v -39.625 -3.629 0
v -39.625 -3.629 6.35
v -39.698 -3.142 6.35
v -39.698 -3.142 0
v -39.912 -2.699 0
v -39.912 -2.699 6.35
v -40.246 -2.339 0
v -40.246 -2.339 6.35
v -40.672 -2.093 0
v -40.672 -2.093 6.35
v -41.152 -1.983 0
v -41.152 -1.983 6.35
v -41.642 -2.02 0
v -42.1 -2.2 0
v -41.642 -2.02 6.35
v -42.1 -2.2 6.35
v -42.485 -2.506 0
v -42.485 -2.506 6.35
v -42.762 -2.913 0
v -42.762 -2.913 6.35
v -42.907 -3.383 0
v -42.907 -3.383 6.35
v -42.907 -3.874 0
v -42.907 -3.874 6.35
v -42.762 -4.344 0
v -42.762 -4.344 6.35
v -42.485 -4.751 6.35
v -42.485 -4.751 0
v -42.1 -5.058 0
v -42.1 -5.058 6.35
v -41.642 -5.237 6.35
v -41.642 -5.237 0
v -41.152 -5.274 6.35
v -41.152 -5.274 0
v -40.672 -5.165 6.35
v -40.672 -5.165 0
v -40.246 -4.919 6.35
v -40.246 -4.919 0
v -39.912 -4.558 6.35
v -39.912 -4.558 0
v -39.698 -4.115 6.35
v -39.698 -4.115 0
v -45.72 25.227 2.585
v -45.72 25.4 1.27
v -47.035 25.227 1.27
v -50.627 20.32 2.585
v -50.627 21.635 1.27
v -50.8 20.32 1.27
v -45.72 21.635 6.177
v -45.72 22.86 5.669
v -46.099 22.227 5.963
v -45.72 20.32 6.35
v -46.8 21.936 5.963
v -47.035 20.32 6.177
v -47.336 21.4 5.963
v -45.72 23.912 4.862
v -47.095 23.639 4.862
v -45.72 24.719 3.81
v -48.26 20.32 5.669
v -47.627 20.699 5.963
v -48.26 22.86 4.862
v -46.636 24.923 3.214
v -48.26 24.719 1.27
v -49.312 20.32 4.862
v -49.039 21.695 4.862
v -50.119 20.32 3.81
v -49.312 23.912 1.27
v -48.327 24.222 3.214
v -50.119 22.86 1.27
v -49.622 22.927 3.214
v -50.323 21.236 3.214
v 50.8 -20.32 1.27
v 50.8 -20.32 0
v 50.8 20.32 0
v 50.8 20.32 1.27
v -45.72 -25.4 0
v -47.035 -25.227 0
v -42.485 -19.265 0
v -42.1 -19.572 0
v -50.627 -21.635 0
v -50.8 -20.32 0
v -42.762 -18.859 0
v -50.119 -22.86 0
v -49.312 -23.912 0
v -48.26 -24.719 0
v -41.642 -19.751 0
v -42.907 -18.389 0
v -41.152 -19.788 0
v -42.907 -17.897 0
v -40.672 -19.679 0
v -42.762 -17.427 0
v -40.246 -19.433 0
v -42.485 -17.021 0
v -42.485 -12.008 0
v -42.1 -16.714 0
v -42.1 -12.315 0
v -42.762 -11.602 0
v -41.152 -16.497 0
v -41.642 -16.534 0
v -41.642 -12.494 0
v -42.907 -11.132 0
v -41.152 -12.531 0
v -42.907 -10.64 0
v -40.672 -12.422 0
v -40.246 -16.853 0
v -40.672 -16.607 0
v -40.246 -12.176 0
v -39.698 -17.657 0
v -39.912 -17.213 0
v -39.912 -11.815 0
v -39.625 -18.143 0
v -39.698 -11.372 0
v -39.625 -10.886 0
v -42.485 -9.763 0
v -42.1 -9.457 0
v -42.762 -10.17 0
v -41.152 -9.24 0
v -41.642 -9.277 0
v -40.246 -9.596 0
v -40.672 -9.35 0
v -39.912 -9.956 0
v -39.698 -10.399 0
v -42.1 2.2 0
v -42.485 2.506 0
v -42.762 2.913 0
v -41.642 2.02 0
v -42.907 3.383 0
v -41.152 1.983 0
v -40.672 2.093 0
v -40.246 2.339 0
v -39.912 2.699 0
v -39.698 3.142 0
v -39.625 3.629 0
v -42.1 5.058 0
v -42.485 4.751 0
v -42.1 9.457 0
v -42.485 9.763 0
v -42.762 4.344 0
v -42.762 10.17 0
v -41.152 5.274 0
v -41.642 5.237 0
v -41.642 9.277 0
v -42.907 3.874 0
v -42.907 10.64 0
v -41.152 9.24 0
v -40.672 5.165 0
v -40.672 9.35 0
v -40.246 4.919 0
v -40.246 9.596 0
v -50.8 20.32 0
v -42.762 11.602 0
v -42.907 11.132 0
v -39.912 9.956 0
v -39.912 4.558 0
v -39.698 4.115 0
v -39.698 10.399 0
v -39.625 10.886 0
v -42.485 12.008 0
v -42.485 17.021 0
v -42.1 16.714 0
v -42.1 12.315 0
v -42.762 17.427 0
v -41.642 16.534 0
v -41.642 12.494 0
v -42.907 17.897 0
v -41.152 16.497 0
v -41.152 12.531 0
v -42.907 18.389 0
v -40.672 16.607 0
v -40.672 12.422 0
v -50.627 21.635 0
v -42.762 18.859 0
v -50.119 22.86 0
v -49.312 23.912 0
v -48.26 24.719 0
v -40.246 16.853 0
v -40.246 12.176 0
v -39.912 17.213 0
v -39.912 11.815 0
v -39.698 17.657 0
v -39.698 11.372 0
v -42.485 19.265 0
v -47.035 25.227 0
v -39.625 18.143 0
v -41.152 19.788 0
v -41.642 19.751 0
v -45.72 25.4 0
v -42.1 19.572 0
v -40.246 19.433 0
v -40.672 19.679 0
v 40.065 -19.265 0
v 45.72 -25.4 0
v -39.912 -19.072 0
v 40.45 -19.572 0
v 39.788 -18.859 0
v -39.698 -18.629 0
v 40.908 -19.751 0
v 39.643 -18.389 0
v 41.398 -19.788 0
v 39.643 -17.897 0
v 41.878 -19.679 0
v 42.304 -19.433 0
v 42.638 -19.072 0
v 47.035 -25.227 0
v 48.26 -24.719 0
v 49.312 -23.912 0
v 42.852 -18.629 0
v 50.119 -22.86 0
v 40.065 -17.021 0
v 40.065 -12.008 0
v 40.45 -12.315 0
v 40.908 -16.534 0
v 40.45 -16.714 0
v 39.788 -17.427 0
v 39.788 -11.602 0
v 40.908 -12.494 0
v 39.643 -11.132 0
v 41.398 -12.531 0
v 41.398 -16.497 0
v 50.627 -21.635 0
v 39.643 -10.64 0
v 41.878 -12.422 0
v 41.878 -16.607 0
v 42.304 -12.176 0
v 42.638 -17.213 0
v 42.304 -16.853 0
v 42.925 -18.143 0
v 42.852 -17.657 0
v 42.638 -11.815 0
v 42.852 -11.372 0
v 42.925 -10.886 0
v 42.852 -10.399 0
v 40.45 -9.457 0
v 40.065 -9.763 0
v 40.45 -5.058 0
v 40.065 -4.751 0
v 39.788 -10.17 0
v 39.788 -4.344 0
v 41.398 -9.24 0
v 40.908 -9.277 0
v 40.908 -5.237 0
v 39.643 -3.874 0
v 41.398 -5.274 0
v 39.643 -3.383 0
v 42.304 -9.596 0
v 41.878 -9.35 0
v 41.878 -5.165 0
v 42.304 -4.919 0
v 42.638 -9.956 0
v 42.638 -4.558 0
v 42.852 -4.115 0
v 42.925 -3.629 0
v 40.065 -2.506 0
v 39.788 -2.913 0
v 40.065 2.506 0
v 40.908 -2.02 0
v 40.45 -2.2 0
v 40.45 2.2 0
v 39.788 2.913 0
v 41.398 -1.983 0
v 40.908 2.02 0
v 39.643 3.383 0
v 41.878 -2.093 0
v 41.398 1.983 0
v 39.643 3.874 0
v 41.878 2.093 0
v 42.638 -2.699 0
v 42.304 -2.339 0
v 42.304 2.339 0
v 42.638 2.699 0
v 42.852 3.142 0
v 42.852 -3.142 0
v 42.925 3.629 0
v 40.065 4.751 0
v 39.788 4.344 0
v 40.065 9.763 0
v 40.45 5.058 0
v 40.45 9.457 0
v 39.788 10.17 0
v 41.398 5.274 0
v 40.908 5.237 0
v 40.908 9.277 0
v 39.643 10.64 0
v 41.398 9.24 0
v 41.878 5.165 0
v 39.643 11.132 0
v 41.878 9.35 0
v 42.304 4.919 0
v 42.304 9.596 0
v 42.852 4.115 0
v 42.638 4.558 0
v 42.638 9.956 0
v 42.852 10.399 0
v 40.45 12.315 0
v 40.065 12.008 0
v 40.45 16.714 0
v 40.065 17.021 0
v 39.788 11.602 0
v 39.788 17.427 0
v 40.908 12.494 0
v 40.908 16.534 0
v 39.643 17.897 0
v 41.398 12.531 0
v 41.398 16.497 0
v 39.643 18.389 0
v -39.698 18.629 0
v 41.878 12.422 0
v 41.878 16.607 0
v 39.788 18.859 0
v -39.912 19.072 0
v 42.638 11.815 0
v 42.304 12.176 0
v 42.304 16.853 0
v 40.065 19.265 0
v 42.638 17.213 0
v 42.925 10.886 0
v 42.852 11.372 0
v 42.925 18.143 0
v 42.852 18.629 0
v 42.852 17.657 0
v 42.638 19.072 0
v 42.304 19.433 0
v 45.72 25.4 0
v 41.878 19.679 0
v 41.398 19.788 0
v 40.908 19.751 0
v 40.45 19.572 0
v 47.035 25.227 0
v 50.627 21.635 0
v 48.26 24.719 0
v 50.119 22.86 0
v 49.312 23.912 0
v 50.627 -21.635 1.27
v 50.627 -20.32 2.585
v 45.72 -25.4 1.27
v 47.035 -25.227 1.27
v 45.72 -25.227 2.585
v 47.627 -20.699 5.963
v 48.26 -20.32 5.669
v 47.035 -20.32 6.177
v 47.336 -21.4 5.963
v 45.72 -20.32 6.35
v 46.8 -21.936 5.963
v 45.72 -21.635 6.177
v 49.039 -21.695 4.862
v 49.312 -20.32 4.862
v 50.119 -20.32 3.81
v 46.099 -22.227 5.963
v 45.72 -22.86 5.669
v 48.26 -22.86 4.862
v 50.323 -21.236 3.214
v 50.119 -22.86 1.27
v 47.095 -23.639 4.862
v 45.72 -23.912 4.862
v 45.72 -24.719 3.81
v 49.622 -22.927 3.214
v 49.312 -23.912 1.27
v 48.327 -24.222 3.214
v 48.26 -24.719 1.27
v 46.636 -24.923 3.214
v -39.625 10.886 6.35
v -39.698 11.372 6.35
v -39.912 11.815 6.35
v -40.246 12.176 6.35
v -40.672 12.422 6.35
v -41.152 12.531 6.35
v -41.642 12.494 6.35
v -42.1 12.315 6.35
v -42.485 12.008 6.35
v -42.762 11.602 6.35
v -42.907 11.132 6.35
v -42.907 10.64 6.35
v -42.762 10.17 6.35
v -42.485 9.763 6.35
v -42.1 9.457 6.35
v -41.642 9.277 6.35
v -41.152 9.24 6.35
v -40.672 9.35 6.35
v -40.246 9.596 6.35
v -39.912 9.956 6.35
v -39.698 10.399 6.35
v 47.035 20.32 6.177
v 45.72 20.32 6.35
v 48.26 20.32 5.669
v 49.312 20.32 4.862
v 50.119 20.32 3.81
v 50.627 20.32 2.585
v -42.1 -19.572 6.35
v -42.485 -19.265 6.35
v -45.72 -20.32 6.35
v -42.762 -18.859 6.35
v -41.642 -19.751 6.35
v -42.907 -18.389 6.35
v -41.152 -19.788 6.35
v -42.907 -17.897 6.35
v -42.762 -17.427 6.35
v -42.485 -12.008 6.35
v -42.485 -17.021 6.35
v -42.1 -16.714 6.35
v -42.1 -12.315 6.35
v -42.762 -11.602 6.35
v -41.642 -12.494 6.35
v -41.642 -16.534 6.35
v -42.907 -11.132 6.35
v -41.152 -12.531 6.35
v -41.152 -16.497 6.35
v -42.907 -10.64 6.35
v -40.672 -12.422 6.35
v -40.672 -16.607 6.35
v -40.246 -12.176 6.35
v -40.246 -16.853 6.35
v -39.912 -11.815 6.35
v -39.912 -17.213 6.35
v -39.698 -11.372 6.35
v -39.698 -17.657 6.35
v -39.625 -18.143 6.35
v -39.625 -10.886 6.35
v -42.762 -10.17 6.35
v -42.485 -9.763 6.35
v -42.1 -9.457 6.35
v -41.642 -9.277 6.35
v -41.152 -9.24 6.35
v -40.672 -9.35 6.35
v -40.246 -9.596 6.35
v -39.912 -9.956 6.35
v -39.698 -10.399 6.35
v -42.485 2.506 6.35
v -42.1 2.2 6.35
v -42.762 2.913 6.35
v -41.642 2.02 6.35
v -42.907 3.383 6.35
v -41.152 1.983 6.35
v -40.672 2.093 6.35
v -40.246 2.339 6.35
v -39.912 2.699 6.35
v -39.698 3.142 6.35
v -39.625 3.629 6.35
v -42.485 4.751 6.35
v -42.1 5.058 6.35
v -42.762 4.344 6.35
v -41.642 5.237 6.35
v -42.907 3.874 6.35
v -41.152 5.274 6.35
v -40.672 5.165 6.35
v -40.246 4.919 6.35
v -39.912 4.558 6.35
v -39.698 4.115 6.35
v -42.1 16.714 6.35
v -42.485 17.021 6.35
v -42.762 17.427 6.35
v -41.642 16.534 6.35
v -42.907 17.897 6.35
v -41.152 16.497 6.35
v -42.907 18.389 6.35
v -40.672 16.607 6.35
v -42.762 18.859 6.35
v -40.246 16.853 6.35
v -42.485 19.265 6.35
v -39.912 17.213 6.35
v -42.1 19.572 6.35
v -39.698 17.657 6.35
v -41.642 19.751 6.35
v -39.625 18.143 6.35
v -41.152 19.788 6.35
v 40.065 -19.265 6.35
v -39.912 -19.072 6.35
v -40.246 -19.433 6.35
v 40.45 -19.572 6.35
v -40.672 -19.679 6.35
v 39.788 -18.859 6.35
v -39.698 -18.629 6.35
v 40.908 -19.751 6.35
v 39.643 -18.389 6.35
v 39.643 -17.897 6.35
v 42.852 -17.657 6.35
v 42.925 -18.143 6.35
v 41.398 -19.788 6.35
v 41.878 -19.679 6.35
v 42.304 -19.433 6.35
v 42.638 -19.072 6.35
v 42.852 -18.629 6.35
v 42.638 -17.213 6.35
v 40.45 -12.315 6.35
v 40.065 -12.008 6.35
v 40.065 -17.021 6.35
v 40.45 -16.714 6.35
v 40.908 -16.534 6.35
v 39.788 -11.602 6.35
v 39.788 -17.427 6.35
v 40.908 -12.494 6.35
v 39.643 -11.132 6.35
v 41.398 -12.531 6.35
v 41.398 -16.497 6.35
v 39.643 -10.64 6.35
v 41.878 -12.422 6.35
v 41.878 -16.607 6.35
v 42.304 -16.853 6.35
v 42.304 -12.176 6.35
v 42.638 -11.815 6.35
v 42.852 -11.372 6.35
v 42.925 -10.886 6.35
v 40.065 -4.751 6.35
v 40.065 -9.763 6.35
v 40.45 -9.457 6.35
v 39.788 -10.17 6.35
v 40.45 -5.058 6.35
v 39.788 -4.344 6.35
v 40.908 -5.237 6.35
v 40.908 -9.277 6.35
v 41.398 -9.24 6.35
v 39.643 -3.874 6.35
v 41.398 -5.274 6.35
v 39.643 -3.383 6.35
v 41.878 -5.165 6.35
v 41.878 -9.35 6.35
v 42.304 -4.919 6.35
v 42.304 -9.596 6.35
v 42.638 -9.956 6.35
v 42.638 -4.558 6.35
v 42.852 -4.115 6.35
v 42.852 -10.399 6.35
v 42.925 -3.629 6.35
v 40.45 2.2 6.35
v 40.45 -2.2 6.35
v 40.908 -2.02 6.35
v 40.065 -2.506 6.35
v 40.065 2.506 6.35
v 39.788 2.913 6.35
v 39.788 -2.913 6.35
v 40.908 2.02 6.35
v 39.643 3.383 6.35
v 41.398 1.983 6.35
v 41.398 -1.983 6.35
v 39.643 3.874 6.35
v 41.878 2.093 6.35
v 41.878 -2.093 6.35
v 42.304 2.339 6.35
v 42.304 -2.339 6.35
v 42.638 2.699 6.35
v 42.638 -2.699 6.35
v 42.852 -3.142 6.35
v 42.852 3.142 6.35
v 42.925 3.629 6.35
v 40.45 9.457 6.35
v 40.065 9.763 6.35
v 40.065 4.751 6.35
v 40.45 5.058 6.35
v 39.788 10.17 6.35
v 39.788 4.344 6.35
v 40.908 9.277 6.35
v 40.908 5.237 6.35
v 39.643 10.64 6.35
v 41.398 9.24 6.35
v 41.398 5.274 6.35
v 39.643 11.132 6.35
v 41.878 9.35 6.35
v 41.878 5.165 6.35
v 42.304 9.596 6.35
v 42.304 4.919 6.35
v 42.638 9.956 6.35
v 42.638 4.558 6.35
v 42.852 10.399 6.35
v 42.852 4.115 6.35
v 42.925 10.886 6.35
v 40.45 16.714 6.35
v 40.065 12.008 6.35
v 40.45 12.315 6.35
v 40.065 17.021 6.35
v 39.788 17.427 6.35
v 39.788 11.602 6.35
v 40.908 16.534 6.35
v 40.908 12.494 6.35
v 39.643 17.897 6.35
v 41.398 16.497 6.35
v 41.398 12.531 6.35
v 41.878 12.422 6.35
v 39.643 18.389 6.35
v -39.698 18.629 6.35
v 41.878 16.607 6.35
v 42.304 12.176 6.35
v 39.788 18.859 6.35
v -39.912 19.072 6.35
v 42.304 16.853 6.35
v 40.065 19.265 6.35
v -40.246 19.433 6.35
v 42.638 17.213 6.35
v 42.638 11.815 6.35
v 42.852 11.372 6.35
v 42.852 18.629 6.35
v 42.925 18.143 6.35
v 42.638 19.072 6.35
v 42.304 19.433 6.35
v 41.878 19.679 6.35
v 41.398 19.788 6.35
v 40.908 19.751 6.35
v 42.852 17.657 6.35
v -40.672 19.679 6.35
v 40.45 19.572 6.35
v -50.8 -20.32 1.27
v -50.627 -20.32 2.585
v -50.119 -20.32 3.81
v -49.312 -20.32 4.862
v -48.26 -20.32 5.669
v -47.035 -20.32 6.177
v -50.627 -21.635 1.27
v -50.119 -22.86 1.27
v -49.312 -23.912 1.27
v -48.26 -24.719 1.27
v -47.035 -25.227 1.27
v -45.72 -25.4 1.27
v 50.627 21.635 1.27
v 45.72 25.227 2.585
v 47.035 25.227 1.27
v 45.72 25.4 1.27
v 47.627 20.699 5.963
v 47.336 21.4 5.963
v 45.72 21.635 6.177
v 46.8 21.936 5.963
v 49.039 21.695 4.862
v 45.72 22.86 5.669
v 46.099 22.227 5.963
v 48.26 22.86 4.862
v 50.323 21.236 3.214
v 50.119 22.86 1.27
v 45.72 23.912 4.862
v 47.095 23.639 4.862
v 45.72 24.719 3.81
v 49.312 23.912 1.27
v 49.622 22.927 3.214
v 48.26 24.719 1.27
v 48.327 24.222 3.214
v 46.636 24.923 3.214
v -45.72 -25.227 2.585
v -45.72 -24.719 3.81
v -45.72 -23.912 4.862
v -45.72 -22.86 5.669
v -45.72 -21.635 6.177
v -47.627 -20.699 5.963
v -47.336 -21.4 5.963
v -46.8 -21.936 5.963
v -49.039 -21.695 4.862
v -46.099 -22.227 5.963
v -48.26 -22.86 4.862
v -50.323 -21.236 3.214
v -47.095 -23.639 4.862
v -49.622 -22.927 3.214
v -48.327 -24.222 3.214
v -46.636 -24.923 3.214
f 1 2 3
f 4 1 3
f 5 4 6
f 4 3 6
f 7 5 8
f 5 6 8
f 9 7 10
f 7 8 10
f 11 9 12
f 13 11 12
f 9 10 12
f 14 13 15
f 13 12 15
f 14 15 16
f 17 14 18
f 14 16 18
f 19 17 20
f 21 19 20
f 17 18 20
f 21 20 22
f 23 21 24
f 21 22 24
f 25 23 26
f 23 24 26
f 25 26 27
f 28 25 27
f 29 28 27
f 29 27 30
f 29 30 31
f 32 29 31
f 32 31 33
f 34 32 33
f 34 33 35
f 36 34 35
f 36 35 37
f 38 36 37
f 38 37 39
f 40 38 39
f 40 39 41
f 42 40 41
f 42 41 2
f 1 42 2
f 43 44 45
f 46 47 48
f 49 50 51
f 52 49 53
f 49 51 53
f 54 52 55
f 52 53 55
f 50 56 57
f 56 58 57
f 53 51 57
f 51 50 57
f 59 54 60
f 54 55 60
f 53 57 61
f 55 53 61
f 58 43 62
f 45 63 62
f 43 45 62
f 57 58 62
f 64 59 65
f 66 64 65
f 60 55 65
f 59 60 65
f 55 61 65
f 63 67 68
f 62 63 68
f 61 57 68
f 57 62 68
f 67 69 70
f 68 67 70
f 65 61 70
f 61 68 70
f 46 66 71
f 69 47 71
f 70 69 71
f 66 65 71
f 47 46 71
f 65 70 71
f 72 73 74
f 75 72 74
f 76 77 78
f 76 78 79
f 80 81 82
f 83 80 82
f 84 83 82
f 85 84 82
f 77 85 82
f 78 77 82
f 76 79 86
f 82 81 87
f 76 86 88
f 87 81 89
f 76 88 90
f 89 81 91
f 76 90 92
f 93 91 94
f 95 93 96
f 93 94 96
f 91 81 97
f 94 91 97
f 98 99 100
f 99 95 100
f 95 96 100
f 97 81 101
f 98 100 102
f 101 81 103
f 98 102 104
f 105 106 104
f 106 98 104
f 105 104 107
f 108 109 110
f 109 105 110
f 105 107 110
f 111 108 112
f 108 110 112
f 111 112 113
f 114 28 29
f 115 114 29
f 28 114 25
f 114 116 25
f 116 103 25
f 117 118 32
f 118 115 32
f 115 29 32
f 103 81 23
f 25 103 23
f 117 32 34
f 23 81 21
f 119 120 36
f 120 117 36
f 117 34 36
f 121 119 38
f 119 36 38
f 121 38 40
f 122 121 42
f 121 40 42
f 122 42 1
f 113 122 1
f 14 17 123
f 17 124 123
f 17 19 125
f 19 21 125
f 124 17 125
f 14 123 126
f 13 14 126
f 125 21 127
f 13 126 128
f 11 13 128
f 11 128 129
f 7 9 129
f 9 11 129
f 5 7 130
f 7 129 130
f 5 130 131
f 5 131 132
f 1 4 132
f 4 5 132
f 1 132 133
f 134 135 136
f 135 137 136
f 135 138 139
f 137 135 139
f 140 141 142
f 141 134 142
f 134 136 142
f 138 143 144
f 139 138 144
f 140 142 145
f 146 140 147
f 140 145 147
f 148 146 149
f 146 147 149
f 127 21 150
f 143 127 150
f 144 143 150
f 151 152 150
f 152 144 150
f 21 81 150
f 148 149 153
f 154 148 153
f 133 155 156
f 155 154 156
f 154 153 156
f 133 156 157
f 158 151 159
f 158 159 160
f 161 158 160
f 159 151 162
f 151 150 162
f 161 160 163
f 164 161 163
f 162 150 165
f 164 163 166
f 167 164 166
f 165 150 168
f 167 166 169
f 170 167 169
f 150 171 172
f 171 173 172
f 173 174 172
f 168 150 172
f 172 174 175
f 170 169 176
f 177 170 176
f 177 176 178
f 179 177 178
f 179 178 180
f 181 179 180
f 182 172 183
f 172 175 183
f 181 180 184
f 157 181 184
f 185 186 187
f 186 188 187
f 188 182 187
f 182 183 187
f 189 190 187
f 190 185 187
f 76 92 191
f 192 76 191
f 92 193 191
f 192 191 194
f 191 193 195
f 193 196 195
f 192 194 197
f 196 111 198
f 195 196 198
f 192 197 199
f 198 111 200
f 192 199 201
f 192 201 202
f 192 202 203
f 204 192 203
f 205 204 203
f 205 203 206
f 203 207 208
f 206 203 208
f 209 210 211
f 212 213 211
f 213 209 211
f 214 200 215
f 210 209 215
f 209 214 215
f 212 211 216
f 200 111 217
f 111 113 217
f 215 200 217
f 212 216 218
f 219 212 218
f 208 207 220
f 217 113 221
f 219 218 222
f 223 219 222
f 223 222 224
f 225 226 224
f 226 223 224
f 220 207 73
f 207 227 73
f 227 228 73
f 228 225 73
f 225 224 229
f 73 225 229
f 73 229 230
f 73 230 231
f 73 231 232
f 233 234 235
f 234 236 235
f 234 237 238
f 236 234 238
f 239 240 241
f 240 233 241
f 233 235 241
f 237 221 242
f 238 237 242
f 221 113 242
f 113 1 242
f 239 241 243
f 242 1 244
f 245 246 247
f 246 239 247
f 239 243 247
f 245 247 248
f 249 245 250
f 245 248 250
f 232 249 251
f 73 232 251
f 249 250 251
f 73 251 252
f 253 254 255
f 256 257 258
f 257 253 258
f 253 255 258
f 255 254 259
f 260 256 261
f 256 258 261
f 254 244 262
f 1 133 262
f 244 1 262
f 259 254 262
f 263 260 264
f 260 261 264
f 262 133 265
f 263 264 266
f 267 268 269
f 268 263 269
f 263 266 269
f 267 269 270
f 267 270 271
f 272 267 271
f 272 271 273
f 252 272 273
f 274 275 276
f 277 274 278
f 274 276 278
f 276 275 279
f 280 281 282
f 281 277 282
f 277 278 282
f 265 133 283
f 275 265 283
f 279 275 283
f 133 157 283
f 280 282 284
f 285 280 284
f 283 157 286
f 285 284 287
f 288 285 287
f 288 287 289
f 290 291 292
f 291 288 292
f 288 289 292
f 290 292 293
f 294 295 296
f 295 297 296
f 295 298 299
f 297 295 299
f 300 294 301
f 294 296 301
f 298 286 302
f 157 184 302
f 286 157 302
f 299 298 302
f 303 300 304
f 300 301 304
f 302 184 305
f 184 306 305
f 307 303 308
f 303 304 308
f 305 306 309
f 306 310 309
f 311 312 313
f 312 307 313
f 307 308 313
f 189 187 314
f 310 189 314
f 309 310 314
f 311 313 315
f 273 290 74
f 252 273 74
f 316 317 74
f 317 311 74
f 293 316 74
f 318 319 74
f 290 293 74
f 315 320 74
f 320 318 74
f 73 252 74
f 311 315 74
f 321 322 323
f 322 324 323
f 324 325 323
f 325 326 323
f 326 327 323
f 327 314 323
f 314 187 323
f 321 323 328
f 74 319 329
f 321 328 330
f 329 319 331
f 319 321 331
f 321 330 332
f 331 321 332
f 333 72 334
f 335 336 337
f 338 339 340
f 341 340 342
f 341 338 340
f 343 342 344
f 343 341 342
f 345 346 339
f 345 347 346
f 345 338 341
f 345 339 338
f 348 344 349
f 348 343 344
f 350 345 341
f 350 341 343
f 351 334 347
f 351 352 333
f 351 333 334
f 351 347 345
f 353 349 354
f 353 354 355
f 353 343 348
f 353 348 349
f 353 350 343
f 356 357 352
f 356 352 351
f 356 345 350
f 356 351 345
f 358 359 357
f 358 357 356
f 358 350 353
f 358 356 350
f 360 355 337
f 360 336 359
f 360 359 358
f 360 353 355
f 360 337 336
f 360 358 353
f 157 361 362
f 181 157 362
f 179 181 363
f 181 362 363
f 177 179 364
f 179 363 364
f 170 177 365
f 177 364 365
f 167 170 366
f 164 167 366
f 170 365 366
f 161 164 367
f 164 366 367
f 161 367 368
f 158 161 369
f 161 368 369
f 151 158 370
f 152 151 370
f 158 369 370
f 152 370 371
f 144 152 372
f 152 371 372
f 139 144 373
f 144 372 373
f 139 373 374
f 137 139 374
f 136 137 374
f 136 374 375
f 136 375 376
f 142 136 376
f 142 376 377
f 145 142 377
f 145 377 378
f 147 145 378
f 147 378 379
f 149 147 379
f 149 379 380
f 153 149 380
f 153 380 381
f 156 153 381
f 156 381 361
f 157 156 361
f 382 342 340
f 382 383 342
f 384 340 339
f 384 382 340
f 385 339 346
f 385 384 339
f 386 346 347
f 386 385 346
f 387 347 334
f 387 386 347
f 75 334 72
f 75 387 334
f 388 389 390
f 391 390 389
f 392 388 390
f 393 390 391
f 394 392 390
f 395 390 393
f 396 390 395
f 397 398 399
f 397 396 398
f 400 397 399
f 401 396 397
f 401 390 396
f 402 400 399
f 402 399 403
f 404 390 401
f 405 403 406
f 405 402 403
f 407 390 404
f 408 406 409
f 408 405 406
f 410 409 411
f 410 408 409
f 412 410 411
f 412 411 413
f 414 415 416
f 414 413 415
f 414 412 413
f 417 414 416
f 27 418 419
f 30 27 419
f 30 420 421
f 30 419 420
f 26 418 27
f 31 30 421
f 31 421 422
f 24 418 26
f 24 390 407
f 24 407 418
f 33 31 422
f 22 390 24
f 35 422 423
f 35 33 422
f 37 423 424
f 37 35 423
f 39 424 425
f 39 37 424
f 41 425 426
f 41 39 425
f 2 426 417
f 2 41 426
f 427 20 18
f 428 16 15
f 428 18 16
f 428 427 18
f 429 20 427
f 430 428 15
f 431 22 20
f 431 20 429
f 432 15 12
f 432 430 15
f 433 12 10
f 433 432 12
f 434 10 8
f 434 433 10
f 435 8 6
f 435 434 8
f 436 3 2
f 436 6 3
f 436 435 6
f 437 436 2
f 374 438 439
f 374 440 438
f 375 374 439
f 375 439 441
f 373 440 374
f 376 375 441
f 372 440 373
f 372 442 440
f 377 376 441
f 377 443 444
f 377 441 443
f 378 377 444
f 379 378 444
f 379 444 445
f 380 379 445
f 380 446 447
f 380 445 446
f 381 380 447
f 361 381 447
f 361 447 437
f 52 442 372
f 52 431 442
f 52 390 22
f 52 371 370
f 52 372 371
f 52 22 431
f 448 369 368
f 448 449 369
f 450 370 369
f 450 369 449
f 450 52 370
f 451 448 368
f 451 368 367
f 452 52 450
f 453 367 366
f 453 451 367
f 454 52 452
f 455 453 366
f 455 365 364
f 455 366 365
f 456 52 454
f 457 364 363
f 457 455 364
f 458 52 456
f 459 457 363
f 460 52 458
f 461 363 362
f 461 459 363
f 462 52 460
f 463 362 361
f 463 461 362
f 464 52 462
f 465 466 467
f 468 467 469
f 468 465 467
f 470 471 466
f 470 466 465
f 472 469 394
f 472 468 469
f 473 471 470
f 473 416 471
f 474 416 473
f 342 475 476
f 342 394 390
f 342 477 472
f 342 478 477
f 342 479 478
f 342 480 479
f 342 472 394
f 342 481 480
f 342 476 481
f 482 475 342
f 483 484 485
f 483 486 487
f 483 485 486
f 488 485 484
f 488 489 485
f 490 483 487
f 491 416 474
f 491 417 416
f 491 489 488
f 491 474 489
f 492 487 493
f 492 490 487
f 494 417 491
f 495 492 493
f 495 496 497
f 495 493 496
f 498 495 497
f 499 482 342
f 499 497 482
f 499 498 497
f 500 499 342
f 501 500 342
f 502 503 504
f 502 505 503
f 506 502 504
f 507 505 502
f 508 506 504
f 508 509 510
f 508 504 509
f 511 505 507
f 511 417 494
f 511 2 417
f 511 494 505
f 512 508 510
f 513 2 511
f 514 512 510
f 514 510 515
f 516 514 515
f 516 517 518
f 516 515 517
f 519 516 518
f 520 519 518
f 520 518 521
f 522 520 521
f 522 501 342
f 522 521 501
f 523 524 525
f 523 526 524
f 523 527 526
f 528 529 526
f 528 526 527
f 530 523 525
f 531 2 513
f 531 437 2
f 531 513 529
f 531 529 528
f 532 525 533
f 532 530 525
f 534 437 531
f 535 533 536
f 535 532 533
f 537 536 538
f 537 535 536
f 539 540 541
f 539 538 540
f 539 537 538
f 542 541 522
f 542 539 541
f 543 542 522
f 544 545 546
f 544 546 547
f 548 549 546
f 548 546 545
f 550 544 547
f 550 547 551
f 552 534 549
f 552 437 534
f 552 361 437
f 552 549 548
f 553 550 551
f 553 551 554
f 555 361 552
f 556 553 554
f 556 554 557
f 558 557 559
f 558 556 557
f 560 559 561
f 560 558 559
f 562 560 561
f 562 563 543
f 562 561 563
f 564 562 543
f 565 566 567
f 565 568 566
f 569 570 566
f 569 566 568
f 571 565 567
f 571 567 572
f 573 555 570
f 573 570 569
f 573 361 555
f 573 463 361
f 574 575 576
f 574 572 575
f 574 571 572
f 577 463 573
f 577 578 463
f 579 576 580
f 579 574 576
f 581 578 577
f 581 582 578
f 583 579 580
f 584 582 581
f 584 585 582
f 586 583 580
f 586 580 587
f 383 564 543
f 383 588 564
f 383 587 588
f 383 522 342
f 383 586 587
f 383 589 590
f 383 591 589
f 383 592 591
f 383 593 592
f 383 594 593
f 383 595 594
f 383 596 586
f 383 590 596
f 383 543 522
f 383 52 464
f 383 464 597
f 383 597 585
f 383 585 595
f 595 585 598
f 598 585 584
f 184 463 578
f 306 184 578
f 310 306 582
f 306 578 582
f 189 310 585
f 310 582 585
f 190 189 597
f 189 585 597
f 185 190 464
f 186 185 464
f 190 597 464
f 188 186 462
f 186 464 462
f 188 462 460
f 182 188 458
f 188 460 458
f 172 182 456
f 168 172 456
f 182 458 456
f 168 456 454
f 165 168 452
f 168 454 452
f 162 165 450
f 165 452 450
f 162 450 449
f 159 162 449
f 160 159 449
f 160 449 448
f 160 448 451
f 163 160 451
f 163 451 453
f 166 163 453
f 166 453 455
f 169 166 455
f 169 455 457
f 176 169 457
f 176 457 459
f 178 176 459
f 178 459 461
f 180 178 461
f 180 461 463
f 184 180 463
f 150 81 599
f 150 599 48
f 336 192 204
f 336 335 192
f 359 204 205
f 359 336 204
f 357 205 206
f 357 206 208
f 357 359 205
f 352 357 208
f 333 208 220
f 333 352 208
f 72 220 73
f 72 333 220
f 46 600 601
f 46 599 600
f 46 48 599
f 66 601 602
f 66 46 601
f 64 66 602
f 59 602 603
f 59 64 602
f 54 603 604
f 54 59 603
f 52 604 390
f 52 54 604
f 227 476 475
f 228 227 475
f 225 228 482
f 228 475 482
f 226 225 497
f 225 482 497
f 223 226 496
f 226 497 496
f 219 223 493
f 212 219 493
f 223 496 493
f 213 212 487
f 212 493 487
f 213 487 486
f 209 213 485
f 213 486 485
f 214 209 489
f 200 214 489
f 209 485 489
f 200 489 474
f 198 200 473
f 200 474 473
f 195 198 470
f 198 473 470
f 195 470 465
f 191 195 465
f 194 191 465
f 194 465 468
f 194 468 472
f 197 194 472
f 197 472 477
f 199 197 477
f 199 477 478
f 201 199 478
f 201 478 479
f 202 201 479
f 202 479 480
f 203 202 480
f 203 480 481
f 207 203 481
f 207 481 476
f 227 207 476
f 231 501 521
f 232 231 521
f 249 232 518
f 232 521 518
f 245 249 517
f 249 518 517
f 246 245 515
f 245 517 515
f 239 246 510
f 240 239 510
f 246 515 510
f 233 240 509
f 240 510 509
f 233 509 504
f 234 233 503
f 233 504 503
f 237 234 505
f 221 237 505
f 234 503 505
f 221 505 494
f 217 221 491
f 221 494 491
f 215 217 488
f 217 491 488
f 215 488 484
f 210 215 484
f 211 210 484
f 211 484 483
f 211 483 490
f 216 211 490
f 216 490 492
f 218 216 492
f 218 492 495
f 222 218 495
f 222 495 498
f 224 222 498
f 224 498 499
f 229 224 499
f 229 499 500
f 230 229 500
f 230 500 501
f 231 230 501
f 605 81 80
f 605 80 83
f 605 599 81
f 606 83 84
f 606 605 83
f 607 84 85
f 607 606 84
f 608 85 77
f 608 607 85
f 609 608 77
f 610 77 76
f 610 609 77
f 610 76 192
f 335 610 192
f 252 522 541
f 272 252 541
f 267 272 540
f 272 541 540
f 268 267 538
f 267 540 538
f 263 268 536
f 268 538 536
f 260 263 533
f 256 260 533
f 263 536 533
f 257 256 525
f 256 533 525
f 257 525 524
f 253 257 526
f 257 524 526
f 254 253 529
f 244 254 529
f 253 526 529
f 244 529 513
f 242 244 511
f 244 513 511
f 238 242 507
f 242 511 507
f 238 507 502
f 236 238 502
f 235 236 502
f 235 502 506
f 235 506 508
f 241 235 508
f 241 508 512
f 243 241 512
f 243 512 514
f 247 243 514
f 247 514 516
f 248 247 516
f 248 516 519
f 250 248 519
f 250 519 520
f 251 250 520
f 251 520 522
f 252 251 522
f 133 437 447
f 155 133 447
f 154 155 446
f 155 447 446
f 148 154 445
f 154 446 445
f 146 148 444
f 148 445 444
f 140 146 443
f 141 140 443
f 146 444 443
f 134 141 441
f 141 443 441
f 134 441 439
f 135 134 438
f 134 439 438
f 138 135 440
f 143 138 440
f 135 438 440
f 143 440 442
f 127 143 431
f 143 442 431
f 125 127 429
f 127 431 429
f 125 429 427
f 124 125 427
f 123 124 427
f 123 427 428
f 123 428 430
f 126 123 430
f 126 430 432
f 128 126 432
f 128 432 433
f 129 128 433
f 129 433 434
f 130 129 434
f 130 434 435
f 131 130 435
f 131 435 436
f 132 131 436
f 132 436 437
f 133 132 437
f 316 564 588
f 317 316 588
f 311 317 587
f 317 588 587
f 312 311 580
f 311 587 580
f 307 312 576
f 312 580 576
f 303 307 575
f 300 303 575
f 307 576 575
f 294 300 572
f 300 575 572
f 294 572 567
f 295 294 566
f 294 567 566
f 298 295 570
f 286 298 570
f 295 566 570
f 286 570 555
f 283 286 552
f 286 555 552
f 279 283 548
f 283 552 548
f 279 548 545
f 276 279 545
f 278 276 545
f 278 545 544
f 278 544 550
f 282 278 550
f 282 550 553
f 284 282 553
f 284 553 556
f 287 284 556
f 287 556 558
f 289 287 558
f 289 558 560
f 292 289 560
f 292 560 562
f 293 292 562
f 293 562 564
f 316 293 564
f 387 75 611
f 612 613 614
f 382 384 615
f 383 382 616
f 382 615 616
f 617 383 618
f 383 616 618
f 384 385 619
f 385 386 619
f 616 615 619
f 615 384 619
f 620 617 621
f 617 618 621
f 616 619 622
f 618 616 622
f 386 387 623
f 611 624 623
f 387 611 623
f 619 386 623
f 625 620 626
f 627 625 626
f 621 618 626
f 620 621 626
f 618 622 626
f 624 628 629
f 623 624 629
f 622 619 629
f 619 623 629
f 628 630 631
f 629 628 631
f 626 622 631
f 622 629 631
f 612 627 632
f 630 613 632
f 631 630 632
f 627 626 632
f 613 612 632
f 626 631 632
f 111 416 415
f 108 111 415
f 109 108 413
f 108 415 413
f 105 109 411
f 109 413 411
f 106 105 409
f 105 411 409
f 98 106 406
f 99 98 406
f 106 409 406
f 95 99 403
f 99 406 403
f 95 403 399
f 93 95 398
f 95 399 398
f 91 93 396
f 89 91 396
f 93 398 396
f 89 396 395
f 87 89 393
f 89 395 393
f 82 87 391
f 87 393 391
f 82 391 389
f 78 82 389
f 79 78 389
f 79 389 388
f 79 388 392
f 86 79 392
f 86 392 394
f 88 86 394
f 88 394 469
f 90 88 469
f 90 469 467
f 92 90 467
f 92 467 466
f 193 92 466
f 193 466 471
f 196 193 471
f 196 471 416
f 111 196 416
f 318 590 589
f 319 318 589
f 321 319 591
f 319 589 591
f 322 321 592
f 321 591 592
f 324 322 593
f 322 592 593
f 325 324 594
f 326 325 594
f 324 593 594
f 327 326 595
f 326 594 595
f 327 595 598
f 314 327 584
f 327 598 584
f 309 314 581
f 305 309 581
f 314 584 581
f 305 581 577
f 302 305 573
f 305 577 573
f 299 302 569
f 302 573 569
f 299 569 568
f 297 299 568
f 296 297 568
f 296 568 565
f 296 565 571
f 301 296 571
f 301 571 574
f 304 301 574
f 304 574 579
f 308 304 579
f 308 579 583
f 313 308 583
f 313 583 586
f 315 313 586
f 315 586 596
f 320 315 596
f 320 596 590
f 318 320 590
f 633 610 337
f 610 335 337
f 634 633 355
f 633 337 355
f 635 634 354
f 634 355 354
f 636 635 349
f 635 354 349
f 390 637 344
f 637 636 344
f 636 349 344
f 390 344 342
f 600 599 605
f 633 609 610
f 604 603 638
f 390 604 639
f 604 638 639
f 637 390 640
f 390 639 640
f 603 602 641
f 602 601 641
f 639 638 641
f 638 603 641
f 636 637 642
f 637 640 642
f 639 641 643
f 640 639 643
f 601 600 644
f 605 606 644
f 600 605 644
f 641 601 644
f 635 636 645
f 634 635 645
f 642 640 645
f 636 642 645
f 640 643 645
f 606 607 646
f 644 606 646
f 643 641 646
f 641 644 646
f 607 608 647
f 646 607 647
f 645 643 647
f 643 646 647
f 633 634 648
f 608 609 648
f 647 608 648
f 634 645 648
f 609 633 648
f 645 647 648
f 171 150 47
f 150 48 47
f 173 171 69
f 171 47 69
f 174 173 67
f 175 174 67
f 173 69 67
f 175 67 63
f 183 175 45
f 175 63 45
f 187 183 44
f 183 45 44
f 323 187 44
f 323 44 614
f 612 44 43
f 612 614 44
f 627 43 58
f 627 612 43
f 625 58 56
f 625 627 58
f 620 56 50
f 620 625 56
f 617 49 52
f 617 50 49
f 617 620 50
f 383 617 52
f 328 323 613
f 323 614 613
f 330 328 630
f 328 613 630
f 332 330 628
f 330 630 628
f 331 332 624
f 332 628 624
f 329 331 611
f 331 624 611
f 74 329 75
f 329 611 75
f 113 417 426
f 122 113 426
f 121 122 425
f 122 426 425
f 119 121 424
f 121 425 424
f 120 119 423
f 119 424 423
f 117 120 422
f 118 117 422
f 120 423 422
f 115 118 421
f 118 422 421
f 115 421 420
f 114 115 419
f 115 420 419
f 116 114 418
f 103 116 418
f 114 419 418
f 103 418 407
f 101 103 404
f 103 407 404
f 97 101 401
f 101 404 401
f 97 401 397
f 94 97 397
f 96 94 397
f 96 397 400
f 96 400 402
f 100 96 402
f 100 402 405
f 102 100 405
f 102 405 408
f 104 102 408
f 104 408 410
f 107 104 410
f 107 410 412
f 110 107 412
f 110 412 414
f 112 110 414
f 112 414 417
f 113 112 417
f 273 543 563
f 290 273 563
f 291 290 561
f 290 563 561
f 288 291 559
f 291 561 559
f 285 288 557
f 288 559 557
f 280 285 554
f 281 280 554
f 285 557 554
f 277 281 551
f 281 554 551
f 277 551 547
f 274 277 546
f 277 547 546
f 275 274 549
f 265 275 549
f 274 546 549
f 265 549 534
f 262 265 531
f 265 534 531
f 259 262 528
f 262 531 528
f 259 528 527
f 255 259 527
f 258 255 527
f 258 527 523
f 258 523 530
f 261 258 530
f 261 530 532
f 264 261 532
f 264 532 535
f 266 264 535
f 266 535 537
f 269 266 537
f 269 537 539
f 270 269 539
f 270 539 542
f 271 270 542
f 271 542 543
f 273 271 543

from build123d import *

# Parameters (mm, degrees)
F0_W     = 101.6
F0_H     = 50.8
F1_DEPTH = 6.35
F2_R     = 1.65
F3_DEPTH = 25.4
F4_R     = 5.08


with BuildPart() as f1:
    # F0 (on Top) → F1 (new body)
    with BuildSketch(Plane.XY):
        Rectangle(F0_W, F0_H)
    extrude(amount=F1_DEPTH)

    # F2 (on face) → F3 (cut)
    with BuildSketch(Plane.XY.offset(6.35)):
        with Locations((-41.275, 10.885714)):
            Circle(F2_R)
        with Locations((-41.275, 3.628571)):
            Circle(F2_R)
        with Locations((-41.275, -3.628571)):
            Circle(F2_R)
        with Locations((-41.275, -10.885714)):
            Circle(F2_R)
        with Locations((-41.275, -18.142857)):
            Circle(F2_R)
        with Locations((-41.275, 18.142857)):
            Circle(F2_R)
        with Locations((41.275, 18.142857)):
            Circle(F2_R)
        with Locations((41.275, 10.885714)):
            Circle(F2_R)
        with Locations((41.275, 3.628571)):
            Circle(F2_R)
        with Locations((41.275, -3.628571)):
            Circle(F2_R)
        with Locations((41.275, -10.885714)):
            Circle(F2_R)
        with Locations((41.275, -18.142857)):
            Circle(F2_R)
    extrude(amount=-F3_DEPTH, mode=Mode.SUBTRACT)

    # F4
    f4_edges = [f1.edges().sort_by_distance(p)[0] for p in [
        (-50.8, 25.4, 3.175),
        (-50.8, -25.4, 3.175),
        (50.8, -25.4, 3.175),
        (50.8, 25.4, 3.175),
        (50.8, 0, 6.35),
        (0, 25.4, 6.35),
        (-50.8, 0, 6.35),
        (0, -25.4, 6.35),
    ]]
    fillet(f4_edges, radius=F4_R)


solid = f1.part
